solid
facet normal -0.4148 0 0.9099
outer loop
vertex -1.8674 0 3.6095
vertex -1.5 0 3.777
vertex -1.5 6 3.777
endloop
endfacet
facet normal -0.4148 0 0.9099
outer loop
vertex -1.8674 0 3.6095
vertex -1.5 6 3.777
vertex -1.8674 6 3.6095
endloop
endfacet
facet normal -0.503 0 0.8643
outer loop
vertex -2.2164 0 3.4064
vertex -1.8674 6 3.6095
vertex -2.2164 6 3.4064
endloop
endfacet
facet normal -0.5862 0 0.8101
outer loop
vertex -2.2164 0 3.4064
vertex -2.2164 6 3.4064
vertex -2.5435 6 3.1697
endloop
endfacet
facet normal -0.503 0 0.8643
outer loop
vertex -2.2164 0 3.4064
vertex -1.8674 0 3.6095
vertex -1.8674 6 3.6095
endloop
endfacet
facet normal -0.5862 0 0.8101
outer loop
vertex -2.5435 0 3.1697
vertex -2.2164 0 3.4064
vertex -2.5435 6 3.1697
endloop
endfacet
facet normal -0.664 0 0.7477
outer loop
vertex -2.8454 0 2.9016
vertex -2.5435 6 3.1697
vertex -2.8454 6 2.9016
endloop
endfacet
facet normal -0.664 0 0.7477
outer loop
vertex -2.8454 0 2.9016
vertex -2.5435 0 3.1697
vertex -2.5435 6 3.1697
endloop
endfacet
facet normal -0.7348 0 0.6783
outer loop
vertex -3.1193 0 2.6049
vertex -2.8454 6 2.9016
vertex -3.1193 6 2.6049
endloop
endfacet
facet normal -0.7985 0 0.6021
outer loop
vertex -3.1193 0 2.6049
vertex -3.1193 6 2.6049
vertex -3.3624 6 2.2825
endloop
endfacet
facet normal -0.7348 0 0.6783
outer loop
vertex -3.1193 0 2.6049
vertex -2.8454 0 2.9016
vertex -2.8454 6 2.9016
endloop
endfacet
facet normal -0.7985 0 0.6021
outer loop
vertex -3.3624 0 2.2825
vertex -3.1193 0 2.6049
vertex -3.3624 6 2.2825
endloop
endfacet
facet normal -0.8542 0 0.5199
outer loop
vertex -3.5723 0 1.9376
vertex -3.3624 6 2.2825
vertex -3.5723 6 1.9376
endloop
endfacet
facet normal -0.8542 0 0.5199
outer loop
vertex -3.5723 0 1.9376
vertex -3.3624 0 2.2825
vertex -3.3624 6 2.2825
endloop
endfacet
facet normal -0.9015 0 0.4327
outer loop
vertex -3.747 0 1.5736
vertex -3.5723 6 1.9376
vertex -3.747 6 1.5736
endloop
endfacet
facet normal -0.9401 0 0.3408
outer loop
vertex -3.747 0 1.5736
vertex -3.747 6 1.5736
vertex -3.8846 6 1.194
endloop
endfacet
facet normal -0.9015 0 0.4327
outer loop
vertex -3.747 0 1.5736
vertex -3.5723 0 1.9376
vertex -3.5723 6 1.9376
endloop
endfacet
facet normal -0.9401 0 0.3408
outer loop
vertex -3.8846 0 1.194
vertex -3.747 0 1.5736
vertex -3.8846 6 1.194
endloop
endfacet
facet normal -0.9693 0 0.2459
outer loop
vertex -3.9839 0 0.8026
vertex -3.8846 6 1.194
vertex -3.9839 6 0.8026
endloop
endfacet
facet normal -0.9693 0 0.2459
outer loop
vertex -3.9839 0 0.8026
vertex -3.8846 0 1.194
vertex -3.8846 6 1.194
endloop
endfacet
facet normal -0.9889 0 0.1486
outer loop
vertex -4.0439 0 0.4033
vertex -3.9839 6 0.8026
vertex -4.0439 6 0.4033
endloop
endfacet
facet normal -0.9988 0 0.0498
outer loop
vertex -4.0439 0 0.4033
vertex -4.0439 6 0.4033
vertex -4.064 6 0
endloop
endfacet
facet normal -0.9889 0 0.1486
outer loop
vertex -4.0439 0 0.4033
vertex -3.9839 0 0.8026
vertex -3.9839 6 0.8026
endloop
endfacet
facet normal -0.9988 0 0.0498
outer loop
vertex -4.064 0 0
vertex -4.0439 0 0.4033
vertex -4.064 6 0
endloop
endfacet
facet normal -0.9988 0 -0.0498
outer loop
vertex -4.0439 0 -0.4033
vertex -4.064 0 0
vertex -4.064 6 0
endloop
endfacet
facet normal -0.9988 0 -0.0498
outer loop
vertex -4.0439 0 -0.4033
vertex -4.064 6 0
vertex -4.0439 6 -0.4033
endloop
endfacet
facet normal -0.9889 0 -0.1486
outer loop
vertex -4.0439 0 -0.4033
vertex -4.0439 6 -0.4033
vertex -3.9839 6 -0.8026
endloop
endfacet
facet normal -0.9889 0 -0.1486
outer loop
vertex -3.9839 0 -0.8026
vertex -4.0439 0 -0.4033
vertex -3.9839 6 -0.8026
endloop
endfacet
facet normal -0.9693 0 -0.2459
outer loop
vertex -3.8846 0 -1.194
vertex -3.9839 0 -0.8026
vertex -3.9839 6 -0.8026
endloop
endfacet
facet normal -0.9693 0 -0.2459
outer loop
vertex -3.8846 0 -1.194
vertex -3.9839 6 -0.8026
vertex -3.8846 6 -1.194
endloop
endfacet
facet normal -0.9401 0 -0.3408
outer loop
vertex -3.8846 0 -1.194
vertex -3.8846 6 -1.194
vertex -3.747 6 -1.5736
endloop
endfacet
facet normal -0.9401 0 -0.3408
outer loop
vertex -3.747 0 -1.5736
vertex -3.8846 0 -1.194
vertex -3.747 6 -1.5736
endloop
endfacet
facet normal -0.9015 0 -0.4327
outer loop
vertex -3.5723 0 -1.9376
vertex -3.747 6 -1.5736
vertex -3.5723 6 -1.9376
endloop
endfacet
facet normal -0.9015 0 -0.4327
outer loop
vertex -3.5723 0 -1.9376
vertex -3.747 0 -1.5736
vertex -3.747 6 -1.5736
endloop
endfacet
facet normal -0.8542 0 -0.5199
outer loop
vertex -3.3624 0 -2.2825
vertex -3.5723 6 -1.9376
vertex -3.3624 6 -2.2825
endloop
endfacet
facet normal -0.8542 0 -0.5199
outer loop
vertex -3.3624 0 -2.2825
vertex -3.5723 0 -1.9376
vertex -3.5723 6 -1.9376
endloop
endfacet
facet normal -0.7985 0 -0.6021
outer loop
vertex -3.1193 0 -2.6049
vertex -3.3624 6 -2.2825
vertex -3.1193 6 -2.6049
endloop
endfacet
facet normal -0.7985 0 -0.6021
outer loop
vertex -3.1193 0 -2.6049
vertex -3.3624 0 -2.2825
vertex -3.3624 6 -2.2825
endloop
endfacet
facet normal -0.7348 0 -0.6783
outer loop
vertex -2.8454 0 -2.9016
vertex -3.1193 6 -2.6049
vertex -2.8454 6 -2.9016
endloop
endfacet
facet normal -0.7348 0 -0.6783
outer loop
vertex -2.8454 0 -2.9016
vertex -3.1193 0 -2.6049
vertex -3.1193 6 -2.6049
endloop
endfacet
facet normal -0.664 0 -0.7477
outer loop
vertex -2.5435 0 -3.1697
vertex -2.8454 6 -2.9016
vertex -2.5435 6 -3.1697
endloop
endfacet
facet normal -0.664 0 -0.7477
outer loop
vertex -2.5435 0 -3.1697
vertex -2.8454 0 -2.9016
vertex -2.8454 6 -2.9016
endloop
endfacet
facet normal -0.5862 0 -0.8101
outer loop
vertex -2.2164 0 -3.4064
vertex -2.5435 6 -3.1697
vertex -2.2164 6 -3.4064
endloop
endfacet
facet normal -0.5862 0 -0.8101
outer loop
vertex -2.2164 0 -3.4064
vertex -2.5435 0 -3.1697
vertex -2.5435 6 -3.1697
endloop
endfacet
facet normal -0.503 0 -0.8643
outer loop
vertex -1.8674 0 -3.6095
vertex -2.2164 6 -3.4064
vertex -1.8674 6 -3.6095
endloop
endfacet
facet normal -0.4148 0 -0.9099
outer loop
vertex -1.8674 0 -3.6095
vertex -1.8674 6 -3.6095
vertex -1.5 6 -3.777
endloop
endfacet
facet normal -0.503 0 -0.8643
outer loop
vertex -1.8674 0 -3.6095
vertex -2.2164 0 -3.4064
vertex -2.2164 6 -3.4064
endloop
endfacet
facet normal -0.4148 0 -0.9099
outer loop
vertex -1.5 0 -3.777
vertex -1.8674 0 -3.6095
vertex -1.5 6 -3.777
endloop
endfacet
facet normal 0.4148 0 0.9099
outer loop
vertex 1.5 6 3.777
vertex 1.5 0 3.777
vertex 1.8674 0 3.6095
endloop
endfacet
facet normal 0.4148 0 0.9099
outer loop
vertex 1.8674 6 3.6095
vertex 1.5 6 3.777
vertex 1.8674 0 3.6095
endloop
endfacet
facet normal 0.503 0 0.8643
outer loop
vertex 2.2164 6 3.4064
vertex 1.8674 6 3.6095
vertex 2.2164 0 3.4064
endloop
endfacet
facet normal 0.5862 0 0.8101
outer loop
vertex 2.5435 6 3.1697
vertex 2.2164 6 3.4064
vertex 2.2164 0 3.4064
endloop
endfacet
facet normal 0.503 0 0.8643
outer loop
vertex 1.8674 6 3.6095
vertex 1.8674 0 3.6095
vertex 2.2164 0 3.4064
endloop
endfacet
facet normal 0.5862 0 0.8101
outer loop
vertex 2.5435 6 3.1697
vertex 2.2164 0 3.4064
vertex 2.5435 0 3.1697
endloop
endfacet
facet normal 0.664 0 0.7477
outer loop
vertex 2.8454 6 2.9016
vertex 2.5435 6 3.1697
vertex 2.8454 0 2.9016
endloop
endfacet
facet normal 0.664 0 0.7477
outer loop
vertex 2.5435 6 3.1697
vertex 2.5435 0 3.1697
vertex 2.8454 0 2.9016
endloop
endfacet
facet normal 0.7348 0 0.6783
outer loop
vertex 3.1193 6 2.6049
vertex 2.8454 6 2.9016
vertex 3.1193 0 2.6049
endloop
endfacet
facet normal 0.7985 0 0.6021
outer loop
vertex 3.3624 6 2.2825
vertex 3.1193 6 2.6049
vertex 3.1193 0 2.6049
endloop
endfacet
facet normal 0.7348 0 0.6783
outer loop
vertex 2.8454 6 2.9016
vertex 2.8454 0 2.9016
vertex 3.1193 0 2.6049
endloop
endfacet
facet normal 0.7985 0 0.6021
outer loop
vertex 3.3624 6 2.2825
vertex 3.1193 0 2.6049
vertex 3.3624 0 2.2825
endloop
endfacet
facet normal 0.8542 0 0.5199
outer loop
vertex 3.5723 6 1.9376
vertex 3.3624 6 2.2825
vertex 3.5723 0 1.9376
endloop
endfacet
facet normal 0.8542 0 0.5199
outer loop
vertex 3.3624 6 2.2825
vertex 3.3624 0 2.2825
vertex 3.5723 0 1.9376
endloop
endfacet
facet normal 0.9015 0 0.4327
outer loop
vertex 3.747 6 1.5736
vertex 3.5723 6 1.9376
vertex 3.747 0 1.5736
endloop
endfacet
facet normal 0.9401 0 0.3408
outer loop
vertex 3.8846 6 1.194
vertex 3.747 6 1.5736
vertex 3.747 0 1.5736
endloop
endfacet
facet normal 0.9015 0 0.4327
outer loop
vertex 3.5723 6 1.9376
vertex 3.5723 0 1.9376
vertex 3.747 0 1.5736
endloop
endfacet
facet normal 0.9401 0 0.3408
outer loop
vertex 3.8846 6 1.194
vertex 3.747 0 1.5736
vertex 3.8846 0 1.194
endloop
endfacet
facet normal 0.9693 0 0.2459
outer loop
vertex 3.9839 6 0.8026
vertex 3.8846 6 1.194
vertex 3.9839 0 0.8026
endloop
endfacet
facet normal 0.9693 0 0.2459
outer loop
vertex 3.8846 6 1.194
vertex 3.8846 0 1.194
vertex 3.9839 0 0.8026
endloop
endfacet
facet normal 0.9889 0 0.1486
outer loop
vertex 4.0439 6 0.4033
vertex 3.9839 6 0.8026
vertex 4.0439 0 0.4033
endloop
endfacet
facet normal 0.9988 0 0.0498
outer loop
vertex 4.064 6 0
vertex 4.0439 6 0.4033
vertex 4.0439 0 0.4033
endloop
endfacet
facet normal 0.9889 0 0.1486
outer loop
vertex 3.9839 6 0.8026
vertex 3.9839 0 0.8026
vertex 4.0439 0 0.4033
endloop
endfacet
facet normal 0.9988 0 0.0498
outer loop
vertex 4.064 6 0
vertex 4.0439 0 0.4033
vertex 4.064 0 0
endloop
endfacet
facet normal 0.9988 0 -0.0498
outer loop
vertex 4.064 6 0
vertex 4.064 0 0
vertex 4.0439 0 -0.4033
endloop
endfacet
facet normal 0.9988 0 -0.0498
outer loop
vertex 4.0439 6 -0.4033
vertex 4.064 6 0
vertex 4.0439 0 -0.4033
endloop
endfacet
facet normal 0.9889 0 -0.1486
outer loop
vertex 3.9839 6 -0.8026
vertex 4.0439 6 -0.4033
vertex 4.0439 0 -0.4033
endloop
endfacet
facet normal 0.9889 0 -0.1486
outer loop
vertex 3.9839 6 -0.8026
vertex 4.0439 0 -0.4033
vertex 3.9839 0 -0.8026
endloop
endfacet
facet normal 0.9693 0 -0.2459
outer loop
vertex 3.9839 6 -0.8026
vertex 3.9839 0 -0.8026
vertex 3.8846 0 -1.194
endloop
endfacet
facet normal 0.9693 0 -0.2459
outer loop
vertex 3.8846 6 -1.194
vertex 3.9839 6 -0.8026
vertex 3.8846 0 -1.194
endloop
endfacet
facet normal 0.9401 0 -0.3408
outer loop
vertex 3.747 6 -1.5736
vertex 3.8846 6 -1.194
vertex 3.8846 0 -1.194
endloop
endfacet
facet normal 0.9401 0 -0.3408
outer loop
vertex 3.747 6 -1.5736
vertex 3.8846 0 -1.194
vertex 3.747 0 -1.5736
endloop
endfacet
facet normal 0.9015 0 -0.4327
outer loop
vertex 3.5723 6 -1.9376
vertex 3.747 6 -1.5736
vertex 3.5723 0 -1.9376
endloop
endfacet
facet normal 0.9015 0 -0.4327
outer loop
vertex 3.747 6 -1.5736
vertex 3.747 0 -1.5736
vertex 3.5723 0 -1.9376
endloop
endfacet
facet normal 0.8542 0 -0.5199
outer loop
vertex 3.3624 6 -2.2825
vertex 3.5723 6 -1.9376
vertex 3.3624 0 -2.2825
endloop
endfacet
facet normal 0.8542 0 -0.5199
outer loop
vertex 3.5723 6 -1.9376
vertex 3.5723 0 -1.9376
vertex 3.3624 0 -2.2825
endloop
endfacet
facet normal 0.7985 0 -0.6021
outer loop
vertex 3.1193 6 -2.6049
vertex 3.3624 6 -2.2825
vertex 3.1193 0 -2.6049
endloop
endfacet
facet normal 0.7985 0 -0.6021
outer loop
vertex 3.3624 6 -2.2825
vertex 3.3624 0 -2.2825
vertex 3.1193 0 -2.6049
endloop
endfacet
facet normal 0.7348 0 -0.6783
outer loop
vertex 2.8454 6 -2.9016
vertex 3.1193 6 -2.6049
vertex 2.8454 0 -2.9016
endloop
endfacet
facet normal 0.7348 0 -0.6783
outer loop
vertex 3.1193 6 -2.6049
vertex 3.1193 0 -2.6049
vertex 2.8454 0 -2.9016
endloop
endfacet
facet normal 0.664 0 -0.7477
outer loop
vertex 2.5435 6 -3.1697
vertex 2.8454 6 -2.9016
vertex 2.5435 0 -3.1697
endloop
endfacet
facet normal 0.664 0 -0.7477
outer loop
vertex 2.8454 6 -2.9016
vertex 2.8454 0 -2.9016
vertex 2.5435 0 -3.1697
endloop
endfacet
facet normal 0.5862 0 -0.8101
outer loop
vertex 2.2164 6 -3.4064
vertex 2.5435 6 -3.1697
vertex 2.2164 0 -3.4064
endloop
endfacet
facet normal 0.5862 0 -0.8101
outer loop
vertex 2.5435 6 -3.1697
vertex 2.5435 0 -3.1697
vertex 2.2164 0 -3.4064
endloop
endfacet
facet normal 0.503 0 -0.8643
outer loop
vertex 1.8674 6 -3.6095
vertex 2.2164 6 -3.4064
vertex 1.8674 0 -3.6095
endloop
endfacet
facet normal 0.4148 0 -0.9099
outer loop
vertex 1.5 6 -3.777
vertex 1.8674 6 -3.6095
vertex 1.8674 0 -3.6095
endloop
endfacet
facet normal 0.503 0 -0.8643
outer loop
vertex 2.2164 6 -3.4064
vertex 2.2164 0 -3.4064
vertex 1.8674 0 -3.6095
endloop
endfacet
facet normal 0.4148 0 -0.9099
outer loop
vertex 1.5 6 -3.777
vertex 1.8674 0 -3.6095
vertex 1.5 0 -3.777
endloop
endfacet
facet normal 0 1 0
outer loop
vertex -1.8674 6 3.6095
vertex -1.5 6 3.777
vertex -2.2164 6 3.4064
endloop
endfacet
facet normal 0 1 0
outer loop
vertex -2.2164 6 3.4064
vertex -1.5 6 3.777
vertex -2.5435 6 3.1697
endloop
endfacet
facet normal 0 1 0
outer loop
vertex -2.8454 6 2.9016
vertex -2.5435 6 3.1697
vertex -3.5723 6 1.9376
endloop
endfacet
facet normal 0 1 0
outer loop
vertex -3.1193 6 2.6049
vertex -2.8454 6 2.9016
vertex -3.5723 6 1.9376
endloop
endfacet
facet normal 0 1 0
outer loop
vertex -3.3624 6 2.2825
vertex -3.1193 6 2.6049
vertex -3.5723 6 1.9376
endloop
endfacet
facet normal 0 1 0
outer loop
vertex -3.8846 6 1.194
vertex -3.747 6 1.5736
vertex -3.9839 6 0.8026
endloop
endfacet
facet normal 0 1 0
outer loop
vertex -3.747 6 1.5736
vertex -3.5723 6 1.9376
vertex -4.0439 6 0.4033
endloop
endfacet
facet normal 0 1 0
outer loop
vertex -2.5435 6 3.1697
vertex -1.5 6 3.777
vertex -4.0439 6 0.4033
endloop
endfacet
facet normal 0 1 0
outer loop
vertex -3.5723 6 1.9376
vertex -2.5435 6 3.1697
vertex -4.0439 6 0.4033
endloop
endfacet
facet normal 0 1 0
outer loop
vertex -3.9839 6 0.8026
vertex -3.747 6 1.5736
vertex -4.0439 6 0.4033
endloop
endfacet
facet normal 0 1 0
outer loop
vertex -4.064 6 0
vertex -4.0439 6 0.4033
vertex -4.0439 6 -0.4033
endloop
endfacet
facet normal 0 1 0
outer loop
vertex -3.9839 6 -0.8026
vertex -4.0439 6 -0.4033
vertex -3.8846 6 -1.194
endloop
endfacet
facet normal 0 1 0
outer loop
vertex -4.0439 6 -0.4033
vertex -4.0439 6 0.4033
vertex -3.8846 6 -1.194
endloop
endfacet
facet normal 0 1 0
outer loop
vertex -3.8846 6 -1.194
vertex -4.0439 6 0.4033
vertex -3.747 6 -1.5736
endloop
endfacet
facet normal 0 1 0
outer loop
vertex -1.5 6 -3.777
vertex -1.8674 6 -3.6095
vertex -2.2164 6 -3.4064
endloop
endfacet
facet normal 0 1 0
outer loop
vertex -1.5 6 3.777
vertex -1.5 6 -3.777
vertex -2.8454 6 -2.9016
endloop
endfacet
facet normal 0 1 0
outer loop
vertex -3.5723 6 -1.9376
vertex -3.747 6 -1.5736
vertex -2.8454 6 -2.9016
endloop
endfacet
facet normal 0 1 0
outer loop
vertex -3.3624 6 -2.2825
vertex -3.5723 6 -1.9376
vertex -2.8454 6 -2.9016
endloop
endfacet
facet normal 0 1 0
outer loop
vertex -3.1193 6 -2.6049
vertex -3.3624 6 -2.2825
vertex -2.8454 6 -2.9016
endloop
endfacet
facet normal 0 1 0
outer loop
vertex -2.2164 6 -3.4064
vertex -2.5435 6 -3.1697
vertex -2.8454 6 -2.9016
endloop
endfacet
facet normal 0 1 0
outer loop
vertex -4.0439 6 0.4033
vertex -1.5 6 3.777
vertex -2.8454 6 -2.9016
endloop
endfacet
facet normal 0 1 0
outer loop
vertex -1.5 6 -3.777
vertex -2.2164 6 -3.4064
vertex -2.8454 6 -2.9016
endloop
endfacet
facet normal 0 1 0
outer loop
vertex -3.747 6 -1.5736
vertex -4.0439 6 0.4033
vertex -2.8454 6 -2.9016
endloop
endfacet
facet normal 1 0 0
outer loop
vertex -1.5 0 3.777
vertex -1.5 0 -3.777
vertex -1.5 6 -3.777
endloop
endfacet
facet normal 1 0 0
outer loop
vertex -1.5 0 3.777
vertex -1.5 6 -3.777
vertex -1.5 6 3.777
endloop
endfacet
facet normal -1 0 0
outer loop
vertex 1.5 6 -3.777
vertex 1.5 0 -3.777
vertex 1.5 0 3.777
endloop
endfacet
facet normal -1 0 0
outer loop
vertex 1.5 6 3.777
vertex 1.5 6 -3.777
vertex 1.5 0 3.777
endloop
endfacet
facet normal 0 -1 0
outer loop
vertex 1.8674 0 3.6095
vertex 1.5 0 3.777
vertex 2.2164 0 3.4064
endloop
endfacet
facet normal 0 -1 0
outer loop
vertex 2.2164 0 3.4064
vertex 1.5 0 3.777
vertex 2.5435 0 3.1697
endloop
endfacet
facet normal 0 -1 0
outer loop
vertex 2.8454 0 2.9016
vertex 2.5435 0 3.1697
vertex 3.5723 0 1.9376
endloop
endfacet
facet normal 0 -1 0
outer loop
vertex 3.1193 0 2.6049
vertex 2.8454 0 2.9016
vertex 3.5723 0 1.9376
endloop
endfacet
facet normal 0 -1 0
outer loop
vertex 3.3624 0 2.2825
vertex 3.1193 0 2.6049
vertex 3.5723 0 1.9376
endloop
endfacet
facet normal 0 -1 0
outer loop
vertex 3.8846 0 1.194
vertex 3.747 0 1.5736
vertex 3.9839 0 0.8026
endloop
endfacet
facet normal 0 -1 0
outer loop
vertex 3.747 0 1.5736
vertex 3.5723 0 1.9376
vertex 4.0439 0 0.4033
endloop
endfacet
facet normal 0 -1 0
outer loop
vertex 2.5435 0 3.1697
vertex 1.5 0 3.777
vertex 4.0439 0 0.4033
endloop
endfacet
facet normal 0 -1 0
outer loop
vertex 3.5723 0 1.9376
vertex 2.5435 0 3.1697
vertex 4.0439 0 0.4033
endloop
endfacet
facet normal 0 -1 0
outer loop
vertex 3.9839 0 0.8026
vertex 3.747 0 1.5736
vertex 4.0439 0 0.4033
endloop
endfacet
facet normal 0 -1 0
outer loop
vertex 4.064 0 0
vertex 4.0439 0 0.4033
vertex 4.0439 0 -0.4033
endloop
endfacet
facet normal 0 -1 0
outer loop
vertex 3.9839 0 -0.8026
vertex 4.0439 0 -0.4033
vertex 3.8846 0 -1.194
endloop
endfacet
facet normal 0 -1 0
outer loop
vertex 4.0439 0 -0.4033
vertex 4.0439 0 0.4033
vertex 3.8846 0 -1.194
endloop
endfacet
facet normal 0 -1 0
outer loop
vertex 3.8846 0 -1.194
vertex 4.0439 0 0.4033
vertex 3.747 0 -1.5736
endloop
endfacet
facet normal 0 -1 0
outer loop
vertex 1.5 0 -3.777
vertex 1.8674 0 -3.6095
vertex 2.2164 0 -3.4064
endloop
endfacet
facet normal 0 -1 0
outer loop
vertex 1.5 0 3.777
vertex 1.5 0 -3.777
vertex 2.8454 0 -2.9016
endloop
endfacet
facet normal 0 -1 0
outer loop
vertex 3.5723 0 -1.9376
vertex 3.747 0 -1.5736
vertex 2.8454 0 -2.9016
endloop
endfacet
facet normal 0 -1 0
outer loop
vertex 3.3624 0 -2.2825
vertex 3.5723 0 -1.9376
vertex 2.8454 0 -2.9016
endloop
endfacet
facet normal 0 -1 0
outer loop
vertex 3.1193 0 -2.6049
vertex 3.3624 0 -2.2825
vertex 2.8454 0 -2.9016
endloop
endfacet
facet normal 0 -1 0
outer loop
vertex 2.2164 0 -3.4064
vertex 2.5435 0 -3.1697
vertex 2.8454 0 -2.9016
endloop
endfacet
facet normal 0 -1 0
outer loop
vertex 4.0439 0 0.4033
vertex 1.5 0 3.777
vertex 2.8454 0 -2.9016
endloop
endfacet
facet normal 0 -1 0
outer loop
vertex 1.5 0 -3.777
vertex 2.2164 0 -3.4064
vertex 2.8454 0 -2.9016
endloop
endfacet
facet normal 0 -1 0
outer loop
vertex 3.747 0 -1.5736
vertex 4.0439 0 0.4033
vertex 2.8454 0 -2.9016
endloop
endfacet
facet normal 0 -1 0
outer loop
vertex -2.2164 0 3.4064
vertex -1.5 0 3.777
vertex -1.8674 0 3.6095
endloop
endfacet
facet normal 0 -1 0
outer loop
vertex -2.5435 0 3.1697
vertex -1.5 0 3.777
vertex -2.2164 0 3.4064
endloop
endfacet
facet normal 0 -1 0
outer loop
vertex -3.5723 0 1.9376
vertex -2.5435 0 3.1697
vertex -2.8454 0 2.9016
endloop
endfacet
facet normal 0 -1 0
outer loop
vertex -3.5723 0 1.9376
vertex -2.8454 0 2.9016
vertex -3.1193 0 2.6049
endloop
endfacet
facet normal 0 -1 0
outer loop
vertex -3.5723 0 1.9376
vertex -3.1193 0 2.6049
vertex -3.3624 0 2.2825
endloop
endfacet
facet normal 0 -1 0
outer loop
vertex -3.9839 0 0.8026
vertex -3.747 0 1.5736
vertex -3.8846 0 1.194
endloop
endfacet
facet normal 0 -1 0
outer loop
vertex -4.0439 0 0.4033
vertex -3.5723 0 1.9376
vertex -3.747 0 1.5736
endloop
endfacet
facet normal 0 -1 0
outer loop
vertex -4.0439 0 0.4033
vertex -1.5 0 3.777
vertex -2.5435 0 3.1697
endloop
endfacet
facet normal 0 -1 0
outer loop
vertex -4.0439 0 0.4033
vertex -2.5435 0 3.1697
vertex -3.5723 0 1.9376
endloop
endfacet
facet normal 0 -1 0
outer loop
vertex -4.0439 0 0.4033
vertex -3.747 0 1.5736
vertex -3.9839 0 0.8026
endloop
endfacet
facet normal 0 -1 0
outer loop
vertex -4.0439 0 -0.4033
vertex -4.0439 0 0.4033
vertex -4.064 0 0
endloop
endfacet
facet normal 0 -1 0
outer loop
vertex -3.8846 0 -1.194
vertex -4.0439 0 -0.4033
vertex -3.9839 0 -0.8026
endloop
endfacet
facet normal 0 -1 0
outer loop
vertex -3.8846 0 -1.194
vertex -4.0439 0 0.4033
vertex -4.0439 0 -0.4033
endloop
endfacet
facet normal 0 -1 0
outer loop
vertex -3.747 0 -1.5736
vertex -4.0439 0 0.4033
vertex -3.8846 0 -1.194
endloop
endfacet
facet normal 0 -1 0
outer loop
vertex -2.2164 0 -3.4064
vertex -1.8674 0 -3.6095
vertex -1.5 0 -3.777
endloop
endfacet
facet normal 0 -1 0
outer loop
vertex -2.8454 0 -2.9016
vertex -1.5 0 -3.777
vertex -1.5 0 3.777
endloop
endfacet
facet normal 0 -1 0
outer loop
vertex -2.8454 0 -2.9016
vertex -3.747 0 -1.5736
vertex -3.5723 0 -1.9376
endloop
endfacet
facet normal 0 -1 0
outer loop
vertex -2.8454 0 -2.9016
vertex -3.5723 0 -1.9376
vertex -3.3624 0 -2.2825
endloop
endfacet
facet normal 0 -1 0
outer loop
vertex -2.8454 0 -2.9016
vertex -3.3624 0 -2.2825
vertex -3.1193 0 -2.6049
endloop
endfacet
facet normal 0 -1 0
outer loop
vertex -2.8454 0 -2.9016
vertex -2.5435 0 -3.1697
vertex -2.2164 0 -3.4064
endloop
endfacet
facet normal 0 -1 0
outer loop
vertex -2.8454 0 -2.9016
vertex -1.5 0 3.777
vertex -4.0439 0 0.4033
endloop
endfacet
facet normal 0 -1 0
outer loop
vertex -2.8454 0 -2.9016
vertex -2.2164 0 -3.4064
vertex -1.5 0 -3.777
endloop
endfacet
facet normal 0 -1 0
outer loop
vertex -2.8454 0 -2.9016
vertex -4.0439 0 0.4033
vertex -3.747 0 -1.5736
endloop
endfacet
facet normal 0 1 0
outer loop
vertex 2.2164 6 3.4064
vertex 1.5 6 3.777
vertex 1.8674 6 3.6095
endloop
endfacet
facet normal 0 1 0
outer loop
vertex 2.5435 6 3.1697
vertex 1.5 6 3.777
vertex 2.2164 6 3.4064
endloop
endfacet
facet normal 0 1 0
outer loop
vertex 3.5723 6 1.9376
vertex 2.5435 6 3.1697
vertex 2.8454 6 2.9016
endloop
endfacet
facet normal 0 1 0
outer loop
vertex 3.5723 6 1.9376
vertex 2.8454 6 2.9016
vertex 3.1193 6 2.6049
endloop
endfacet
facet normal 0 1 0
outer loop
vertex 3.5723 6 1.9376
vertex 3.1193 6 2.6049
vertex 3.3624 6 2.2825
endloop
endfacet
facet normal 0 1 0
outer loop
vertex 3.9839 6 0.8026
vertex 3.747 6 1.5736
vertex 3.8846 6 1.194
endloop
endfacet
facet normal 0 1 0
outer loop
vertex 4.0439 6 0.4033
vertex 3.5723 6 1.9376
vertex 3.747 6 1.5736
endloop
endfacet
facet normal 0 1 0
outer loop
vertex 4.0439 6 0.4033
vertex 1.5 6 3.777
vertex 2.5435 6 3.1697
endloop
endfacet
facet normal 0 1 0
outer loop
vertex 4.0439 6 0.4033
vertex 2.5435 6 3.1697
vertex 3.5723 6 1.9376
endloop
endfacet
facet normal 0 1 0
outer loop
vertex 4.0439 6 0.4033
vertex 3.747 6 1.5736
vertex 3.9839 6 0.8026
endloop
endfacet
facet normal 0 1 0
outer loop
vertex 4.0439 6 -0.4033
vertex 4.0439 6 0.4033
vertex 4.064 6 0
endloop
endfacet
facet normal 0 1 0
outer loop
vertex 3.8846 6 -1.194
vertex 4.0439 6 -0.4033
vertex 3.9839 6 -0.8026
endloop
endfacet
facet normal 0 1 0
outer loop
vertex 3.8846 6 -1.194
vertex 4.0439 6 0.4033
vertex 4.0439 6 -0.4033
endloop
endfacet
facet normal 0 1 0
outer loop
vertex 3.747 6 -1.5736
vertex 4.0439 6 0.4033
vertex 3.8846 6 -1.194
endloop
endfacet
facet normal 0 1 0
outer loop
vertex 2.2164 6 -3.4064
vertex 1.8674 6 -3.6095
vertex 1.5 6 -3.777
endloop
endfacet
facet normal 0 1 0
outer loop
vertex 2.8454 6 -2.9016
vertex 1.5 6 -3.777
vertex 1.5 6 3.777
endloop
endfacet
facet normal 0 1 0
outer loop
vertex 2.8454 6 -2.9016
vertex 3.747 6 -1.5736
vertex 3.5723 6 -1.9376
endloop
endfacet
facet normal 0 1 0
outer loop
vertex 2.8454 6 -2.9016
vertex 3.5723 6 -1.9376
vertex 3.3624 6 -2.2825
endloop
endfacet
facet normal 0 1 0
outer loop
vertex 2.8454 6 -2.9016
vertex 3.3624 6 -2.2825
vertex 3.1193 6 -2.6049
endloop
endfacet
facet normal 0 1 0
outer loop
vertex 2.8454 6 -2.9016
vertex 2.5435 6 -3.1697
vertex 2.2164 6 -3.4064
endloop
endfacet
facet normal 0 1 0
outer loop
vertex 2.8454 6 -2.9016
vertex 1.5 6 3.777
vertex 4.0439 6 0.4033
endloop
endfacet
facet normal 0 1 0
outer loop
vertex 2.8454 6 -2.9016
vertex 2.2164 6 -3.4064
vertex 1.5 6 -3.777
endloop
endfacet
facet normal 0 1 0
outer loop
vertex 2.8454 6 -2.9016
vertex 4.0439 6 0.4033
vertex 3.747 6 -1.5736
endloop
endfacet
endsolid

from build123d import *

# Parameters (mm, degrees)
BOSS_EXTRUDE1_DEPTH   = 6
BOSS_EXTRUDE1_2_DEPTH = 6


with BuildPart() as part:
    # Sketch2 → Boss-Extrude1 (new body)
    with BuildSketch(Plane(origin=(0, 0, 0), x_dir=(1, 0, 0), z_dir=(0, 1, 0))):
        with BuildLine():
            Line((-1.5, 3.777027027), (-1.5, -3.777027027))
            ThreePointArc((-1.5, -3.777027027), (-4.063979966, 0), (-1.5, 3.777027027))
        make_face()
    extrude(amount=BOSS_EXTRUDE1_DEPTH)


with BuildPart() as body_2:
    # Sketch2 → Boss-Extrude1 2 (new body)
    with BuildSketch(Plane(origin=(0, 0, 0), x_dir=(1, 0, 0), z_dir=(0, 1, 0))):
        with BuildLine():
            Line((1.5, 3.777027027), (1.5, -3.777027027))
            ThreePointArc((1.5, -3.777027027), (4.063979966, 0), (1.5, 3.777027027))
        make_face()
    extrude(amount=BOSS_EXTRUDE1_2_DEPTH)


solid = Compound([part.part, body_2.part])
